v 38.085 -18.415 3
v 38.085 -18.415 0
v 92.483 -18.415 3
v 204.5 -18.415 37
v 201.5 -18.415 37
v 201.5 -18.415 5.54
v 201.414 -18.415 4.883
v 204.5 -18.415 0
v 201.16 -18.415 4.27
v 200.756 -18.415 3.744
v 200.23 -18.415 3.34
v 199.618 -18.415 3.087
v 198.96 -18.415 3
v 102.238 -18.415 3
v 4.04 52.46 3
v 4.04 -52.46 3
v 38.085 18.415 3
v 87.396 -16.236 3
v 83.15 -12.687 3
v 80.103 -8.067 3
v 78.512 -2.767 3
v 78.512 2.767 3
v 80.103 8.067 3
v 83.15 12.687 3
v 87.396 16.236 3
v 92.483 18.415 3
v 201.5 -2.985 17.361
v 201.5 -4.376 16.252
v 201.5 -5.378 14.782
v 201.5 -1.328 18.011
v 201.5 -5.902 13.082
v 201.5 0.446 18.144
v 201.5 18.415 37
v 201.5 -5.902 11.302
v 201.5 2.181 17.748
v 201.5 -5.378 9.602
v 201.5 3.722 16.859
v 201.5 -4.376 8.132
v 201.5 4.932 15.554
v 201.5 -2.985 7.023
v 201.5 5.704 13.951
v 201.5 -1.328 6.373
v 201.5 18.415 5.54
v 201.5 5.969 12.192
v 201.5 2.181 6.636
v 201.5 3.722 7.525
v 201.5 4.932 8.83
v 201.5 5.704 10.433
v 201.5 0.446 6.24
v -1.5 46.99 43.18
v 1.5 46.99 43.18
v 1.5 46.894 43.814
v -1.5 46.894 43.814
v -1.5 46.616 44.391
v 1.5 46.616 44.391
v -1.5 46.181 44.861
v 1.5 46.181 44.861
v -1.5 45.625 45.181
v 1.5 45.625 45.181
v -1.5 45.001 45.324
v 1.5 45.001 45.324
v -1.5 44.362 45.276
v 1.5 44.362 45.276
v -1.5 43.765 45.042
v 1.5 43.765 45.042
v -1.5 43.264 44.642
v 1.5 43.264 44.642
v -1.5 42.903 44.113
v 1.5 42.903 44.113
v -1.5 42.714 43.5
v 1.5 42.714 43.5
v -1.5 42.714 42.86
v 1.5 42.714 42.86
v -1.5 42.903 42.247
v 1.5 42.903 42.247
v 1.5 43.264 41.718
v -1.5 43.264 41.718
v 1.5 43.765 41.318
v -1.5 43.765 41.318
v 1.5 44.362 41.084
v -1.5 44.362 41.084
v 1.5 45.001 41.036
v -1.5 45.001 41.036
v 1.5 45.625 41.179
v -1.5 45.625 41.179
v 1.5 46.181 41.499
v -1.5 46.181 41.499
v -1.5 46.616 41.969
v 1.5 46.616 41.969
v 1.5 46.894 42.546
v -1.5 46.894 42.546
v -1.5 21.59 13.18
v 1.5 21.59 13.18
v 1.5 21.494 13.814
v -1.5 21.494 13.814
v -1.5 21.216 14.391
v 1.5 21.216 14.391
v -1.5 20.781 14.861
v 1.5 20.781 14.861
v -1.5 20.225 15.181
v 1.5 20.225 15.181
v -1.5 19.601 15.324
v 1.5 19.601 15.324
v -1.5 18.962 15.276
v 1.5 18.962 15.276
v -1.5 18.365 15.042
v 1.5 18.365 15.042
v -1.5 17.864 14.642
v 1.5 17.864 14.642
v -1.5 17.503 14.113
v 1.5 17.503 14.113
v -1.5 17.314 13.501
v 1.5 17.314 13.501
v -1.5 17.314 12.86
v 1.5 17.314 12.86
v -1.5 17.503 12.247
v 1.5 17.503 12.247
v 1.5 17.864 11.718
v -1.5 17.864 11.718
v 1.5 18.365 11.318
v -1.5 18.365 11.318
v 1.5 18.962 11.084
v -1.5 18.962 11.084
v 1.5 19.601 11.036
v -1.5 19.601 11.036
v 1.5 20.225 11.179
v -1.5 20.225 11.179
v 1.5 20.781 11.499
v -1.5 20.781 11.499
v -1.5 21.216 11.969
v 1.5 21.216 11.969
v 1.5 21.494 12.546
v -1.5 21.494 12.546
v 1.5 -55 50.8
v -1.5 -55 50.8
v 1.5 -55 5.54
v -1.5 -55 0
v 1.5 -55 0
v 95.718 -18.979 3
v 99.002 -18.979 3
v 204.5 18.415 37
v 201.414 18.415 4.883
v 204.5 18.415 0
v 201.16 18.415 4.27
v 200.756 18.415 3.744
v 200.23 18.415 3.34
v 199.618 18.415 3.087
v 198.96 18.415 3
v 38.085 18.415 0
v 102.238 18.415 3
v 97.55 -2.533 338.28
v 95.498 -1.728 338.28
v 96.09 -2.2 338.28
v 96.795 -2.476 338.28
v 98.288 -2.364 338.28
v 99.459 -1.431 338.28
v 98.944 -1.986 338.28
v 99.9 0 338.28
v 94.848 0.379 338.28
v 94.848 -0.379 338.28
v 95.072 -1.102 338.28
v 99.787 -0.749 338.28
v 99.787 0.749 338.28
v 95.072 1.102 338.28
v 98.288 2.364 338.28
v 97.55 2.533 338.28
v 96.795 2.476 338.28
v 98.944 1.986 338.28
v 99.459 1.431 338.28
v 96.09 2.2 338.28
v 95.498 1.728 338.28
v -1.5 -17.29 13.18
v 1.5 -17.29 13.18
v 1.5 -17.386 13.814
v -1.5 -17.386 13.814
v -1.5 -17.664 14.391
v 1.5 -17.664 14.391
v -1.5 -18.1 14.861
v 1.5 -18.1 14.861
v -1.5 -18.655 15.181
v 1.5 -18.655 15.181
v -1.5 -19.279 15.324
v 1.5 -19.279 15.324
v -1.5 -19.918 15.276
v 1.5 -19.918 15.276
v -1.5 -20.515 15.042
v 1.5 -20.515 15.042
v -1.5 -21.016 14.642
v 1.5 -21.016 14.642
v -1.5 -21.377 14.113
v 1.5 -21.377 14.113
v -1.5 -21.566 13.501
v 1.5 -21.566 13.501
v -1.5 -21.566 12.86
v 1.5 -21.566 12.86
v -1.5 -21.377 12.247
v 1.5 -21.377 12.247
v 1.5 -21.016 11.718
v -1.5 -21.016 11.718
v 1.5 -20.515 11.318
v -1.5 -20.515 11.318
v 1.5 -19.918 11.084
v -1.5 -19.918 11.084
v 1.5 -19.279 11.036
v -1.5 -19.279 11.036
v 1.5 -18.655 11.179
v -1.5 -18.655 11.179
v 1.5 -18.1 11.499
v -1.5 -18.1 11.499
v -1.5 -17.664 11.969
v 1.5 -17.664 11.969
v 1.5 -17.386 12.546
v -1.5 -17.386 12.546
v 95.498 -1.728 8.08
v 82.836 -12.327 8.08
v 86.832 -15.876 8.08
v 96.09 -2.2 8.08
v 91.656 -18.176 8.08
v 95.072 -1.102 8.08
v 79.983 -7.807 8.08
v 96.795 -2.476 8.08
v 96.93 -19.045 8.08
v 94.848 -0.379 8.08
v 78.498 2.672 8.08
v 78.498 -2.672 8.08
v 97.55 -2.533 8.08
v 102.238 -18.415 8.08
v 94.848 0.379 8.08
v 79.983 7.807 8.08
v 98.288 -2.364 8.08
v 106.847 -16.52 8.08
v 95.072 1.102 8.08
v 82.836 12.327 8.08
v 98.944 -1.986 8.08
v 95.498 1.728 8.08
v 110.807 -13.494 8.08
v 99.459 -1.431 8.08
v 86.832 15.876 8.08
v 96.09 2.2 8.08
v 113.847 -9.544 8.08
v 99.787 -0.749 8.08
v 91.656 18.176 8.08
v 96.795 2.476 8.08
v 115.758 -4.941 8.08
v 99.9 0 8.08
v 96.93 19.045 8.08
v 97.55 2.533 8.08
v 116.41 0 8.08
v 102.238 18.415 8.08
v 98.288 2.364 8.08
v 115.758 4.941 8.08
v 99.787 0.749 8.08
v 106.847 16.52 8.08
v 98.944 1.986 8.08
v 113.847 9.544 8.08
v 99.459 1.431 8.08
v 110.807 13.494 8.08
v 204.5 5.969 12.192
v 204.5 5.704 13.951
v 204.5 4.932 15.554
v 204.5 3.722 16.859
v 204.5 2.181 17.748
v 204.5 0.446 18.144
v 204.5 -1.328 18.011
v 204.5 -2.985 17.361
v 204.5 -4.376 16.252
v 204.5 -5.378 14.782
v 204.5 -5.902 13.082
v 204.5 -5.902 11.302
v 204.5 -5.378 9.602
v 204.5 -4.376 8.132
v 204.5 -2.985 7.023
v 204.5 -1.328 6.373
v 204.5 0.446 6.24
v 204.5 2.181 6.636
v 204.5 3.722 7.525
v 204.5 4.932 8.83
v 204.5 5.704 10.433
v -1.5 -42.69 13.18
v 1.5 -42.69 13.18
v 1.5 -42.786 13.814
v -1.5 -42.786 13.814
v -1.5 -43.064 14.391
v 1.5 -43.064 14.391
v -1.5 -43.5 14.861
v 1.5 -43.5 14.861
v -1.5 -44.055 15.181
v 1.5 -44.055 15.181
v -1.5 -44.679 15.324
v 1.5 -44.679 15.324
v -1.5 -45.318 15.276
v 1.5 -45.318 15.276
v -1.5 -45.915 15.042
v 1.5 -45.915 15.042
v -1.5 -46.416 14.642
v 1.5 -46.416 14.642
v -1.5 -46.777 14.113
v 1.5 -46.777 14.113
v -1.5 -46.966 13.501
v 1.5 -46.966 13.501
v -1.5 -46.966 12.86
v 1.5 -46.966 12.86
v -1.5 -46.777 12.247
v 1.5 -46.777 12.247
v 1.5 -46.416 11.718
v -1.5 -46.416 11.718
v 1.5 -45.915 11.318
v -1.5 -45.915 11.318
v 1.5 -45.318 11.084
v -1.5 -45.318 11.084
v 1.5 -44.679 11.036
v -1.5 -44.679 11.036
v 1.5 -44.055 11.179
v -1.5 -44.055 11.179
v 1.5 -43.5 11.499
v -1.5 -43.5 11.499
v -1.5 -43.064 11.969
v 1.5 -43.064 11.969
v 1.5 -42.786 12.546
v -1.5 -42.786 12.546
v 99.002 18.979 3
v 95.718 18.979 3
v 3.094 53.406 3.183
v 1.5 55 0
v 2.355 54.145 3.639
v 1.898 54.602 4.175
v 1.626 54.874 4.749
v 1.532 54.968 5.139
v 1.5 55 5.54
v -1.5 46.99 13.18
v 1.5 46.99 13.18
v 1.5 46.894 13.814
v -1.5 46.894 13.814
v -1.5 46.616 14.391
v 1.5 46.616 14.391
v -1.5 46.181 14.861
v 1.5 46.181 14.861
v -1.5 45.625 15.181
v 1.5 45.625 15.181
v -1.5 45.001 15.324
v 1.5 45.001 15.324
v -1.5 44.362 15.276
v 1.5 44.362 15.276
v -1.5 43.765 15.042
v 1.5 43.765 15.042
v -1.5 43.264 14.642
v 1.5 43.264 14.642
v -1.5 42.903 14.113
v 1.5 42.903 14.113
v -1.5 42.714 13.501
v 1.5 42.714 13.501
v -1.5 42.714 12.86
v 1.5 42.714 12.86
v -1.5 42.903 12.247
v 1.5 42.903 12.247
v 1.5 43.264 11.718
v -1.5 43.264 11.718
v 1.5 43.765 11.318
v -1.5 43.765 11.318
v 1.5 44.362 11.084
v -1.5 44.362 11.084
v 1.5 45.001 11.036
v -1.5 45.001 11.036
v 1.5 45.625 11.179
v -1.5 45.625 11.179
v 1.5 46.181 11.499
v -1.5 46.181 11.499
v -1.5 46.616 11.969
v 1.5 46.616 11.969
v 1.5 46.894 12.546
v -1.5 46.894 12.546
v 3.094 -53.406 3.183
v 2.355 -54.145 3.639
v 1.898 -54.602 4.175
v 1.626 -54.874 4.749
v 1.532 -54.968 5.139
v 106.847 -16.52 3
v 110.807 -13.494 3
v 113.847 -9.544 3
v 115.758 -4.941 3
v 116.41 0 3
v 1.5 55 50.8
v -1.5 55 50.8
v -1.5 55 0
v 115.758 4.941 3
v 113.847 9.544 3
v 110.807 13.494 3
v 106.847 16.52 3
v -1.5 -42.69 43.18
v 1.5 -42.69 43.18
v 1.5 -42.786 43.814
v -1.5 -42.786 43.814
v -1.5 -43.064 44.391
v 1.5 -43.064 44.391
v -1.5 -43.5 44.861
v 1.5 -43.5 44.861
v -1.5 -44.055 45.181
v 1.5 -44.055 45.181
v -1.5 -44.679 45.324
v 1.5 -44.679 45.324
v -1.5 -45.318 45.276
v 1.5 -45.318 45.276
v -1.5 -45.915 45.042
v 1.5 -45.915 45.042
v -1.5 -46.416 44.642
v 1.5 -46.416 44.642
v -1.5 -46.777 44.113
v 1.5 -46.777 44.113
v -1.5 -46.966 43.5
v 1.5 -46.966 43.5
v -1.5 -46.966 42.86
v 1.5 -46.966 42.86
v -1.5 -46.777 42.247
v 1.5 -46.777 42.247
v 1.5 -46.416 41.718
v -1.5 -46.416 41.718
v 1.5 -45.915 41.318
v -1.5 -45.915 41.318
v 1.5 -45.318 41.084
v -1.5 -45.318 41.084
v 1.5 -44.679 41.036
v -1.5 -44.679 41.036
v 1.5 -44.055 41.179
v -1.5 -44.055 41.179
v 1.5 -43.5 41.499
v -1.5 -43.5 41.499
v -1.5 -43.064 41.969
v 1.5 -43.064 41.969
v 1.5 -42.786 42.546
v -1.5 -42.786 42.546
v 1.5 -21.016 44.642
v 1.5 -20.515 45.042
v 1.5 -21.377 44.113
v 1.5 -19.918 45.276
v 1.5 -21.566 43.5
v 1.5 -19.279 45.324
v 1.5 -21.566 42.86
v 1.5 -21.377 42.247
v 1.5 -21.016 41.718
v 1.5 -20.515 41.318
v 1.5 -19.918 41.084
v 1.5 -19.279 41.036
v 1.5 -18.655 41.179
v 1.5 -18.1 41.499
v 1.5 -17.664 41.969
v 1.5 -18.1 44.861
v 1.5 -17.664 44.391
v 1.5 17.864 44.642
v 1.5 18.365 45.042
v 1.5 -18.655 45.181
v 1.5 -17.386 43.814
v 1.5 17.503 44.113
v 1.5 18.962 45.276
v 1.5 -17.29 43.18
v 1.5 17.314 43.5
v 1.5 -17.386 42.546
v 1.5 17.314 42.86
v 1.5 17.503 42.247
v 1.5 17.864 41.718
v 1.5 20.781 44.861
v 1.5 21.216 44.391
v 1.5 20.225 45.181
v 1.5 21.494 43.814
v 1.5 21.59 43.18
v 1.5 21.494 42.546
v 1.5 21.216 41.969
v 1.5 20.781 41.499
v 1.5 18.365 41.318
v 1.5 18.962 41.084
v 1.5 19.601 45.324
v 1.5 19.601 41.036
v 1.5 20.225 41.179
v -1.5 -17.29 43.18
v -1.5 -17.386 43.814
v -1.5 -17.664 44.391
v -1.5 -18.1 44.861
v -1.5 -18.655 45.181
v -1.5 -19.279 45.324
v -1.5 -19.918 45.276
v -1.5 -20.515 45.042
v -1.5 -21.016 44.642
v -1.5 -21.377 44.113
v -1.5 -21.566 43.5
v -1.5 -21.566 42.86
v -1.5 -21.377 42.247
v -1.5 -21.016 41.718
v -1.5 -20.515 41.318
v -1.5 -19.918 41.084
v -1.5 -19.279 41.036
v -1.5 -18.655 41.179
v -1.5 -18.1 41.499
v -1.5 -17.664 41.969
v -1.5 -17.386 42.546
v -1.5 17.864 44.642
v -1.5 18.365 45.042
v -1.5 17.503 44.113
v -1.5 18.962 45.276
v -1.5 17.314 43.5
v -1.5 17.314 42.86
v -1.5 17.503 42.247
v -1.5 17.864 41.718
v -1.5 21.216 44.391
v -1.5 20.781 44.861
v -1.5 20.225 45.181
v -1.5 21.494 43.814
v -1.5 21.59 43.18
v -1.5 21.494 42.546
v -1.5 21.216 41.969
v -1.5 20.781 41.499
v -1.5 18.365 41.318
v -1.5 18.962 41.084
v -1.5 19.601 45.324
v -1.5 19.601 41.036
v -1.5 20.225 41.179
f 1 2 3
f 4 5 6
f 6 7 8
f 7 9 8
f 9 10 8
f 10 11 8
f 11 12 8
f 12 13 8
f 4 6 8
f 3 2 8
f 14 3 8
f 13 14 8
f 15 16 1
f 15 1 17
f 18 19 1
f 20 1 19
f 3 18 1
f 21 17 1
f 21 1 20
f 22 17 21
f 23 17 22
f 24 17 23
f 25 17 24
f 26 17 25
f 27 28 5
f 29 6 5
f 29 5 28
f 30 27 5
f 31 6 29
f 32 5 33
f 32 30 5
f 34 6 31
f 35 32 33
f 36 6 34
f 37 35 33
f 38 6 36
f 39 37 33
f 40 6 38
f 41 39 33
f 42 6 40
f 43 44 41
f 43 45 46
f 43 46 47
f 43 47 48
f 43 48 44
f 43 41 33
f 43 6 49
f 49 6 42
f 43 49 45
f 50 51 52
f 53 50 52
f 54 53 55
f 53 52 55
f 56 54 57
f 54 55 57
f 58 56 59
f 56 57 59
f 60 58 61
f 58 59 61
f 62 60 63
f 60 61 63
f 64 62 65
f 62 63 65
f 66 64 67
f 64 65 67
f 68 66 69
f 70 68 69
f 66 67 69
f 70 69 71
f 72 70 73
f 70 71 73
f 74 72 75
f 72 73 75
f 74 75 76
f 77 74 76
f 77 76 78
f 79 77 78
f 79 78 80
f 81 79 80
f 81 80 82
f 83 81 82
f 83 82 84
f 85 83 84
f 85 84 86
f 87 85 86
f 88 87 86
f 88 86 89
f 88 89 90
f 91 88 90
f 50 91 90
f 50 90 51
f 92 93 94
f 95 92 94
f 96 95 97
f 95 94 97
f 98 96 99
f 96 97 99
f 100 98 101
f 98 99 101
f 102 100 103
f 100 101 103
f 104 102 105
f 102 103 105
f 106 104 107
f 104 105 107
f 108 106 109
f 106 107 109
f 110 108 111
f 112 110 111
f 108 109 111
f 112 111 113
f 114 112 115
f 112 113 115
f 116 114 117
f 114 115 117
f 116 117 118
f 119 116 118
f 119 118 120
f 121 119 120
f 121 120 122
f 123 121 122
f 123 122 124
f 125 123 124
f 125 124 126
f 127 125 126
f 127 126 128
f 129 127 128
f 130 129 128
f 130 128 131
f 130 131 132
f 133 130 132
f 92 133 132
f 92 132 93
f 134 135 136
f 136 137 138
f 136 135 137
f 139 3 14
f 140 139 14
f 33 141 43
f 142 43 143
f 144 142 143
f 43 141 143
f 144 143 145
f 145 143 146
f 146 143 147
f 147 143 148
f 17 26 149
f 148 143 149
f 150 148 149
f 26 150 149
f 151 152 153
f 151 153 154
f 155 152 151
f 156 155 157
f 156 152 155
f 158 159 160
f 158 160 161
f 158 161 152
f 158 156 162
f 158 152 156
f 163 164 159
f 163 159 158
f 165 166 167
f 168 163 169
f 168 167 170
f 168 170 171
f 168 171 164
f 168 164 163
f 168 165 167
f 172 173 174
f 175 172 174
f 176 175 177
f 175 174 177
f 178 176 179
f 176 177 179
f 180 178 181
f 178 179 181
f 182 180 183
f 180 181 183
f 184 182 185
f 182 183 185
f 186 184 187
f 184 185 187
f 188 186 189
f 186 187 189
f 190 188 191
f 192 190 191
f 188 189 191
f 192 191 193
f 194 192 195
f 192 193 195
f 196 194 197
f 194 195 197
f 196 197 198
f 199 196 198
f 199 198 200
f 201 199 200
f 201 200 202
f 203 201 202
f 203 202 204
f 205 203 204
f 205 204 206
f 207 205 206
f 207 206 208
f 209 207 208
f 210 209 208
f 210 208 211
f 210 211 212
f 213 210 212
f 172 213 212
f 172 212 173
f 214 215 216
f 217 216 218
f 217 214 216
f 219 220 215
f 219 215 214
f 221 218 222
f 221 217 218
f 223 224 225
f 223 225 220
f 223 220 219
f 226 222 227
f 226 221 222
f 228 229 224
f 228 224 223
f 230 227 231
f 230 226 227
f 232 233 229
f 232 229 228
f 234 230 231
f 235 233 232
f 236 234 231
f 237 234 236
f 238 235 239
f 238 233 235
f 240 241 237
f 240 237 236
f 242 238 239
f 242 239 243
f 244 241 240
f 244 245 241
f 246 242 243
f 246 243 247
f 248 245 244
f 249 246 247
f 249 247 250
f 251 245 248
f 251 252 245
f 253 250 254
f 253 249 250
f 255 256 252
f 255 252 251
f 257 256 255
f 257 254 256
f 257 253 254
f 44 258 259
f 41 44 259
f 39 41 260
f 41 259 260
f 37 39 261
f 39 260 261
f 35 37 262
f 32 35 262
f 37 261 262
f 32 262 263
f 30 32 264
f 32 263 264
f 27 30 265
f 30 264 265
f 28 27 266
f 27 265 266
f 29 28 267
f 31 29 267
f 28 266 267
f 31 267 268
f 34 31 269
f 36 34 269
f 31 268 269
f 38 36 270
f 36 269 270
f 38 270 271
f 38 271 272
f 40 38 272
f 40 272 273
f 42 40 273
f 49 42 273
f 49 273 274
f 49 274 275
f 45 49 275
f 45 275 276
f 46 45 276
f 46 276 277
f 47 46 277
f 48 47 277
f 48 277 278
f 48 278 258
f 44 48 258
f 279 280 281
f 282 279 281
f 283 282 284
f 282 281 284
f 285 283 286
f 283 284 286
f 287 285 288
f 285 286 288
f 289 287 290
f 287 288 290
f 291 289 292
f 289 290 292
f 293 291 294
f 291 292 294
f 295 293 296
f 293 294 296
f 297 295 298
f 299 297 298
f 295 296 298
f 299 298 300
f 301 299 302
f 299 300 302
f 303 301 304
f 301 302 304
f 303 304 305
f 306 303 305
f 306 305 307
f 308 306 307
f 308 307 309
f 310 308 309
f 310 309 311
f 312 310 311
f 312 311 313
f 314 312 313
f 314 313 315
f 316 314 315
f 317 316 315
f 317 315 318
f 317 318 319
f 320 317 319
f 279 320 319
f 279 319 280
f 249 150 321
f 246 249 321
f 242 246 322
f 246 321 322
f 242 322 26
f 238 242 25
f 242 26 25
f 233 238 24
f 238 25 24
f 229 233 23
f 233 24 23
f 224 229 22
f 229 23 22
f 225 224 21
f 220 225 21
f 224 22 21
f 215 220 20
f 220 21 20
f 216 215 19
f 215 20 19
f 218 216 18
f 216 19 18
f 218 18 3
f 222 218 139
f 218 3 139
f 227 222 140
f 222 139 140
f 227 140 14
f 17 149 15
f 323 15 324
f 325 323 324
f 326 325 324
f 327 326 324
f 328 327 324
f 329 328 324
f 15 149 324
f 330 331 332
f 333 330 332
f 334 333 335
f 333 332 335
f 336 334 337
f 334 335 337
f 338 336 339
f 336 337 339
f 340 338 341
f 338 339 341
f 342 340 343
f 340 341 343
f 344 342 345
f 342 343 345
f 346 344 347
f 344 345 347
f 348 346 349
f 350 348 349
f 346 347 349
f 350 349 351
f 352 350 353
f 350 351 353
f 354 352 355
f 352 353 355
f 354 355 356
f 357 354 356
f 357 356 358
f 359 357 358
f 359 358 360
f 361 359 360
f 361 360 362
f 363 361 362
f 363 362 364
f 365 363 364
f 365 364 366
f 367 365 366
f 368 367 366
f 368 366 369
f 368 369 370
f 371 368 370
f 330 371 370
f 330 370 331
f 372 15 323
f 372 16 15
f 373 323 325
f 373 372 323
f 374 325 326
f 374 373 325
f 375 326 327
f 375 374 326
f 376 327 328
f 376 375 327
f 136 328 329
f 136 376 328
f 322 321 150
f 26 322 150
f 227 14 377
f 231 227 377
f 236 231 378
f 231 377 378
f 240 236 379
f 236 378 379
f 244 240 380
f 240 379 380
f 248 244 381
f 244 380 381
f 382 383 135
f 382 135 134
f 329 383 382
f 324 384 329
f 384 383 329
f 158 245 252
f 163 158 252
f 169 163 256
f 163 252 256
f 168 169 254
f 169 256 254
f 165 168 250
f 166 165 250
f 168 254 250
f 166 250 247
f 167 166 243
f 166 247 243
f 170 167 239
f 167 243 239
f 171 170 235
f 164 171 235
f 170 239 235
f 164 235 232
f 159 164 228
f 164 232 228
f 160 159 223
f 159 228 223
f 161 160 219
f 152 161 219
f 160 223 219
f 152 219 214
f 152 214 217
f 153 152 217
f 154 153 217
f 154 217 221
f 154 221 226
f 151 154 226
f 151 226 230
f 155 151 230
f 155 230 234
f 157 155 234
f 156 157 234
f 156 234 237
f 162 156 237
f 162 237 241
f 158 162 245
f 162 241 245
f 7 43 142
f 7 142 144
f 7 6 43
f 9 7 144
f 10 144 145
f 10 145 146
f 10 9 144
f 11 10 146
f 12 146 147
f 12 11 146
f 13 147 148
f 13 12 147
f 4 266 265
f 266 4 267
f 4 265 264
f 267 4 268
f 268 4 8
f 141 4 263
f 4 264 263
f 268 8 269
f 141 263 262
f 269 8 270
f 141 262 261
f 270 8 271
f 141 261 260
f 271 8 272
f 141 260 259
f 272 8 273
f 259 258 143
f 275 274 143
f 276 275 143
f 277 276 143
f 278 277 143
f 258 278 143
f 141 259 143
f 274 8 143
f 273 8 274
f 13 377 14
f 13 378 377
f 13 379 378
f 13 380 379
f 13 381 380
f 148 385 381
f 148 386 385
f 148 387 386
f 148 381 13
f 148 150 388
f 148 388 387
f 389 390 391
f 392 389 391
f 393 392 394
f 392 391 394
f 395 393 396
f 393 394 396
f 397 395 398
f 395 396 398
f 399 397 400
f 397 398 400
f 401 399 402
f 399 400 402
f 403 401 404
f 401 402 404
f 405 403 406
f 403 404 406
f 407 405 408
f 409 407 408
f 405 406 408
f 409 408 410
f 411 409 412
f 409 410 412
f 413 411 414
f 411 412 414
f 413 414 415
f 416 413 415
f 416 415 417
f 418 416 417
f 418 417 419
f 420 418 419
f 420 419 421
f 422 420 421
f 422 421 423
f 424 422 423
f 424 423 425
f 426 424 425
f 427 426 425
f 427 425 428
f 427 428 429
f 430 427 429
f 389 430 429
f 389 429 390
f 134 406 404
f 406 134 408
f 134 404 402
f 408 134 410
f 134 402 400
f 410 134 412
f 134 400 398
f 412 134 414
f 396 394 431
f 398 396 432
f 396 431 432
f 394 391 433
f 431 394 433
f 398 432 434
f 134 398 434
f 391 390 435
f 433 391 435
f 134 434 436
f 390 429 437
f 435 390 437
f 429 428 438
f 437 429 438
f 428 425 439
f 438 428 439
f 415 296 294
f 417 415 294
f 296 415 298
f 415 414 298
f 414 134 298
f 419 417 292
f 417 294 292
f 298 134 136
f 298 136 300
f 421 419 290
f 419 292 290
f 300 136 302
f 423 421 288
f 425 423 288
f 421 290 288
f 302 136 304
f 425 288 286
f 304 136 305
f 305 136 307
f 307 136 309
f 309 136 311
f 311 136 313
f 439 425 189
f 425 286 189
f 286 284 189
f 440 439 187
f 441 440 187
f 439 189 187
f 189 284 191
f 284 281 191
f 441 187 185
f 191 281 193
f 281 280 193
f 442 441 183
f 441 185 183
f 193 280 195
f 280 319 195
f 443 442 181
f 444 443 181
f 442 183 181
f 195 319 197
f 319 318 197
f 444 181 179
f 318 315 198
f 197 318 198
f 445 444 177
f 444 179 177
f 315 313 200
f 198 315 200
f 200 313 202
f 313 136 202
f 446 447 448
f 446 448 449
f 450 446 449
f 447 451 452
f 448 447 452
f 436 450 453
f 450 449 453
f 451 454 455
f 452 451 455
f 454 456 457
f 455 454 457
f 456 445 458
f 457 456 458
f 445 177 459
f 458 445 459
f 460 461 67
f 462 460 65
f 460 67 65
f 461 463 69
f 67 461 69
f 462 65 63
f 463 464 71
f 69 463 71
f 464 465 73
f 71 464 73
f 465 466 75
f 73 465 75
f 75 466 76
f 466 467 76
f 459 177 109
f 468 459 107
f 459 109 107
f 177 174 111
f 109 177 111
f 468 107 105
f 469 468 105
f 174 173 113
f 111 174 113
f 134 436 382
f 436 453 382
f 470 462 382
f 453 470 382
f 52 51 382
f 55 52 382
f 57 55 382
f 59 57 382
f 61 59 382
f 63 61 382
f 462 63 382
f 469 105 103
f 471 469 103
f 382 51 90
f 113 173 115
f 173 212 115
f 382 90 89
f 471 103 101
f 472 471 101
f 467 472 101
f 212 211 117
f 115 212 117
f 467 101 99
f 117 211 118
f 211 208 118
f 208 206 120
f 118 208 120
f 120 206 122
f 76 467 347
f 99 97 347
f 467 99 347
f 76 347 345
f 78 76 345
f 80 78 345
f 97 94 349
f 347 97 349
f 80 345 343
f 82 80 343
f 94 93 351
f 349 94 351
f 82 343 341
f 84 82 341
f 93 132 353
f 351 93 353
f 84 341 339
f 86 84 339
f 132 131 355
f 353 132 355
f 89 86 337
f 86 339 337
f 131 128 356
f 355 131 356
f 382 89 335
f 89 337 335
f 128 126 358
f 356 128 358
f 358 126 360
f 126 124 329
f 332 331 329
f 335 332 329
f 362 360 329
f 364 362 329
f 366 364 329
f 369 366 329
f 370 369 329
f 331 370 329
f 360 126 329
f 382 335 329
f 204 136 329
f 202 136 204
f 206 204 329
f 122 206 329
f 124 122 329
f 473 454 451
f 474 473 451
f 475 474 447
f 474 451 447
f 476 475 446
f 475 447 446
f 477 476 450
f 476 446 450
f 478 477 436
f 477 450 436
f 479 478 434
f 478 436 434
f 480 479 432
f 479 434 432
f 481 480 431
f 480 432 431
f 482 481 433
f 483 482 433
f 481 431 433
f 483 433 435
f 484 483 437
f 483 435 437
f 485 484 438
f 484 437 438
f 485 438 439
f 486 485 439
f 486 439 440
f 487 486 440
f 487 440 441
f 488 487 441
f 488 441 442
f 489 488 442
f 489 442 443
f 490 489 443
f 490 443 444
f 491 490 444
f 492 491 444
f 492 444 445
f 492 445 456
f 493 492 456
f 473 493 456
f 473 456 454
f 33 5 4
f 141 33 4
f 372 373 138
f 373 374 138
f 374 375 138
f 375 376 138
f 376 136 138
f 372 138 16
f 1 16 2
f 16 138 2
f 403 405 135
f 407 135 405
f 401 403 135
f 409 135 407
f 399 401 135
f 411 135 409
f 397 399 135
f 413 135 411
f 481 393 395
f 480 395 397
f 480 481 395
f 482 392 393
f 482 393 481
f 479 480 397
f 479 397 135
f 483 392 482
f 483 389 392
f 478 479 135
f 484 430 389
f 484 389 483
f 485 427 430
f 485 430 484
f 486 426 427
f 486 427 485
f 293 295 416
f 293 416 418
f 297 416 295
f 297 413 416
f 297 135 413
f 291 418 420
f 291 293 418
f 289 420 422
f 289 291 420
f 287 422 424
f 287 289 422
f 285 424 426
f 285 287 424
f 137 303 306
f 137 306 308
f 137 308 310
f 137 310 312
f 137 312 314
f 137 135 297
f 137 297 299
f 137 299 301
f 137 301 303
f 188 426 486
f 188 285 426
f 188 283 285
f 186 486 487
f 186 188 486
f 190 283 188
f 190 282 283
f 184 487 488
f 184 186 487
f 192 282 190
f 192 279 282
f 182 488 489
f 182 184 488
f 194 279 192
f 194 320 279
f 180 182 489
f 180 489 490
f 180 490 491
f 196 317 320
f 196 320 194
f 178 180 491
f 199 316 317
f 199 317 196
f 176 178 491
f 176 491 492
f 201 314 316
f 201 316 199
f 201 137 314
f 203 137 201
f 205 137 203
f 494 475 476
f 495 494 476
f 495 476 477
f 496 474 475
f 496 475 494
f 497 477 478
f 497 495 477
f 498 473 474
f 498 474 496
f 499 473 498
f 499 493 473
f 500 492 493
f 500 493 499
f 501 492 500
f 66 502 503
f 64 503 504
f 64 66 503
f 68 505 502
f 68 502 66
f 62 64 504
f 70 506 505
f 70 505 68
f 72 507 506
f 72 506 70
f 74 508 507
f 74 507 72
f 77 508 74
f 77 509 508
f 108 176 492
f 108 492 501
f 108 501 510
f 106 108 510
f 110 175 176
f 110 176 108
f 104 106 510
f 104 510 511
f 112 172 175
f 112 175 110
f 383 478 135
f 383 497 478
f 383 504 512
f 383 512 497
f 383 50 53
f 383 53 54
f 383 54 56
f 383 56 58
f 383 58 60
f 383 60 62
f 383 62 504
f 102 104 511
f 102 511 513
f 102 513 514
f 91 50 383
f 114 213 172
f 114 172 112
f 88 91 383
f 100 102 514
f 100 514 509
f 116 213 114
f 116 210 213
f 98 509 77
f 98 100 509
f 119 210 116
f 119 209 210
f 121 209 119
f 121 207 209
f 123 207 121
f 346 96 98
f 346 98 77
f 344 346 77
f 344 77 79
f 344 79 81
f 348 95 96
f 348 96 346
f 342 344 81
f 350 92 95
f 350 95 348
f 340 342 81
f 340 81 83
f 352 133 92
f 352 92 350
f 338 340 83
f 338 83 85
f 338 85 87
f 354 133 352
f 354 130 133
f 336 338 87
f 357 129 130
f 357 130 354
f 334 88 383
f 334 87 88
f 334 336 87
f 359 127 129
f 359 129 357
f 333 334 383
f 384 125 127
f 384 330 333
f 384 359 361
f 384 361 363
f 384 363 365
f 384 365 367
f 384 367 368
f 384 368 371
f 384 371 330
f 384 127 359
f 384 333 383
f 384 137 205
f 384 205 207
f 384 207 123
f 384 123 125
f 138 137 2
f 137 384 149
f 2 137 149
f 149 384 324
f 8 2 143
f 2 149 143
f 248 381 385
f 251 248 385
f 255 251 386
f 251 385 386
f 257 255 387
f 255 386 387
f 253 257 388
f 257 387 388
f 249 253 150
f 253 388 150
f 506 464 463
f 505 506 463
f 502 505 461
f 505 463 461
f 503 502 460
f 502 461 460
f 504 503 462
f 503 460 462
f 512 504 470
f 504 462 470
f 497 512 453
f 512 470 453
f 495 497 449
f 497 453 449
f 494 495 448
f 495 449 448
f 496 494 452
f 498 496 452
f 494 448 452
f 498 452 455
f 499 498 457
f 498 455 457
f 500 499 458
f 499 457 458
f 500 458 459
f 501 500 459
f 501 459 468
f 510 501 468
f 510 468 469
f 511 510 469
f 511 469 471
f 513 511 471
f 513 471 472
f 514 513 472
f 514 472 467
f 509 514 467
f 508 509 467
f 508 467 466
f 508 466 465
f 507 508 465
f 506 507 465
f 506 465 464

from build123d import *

# Parameters (mm, degrees)
F0_W      = 2.999994
F0_H      = 110.000034
F0_H_2    = 36.83
F1_DEPTH  = 2.999994
F2_DEPTH  = 50.8
F3_DEPTH  = 36.999926
F4_R      = 2.1499957
F5_DEPTH  = 49.276
F6_R      = 5.969
F7_DEPTH  = 38.1
F8_R      = 2.54
F10_DEPTH = 5.08
F11_R     = 2.54
F12_DEPTH = 330.2
F13_R     = 2.54


with BuildPart() as f1:
    # F0 (on Top) → F1 (new body)
    with BuildSketch(Plane.XY):
        Rectangle(F0_W, F0_H)
        Polygon((38.085014, 18.415), (1.499997, 55.000017), (1.499997, -55.000017), (38.085014, -18.415), (201.500105, -18.415), (201.500105, 18.415), align=None)
        with Locations((203.000102, 0)):
            Rectangle(F0_W, F0_H_2)
    extrude(amount=F1_DEPTH)

    # F0 (on Top) → F2 (join)
    with BuildSketch(Plane.XY):
        Rectangle(F0_W, F0_H)
    extrude(amount=F2_DEPTH)

    # F0 (on Top) → F3 (join)
    with BuildSketch(Plane.XY):
        with Locations((203.000102, 0)):
            Rectangle(F0_W, F0_H_2)
    extrude(amount=F3_DEPTH)

    # F4 (on face) → F5 (cut)
    with BuildSketch(Plane.YZ.offset(1.499997)):
        with Locations((-44.840017, 43.18)):
            Circle(F4_R)
        with Locations((-44.840017, 13.18006)):
            Circle(F4_R)
        with Locations((-19.440017, 43.18)):
            Circle(F4_R)
        with Locations((-19.440017, 13.18006)):
            Circle(F4_R)
        with Locations((44.840017, 43.18)):
            Circle(F4_R)
        with Locations((19.440017, 43.18)):
            Circle(F4_R)
        with Locations((19.440017, 13.18006)):
            Circle(F4_R)
        with Locations((44.840017, 13.18006)):
            Circle(F4_R)
    extrude(amount=-F5_DEPTH, mode=Mode.SUBTRACT)

    # F6 (on face) → F7 (cut)
    with BuildSketch(Plane.YZ.offset(204.500099)):
        with Locations((0, 12.192)):
            Circle(F6_R)
    extrude(amount=-F7_DEPTH, mode=Mode.SUBTRACT)

    # F8
    f8_edges = [f1.edges().sort_by_distance(p)[0] for p in [
        (201.500105, 0, 2.999994),
    ]]
    fillet(f8_edges, radius=F8_R)

    # F9 (on face) → F10 (join)
    with BuildSketch(Plane.XY.offset(2.999994)):
        with BuildLine():
            ThreePointArc((92.4825774501, -18.415), (97.360105, -19.05), (102.2376325499, -18.415))
            Line((102.2376325499, -18.415), (92.4825774501, -18.415))
        make_face()
        with BuildLine():
            ThreePointArc((102.2376325499, -18.415), (112.4567834397, -11.6186401996), (116.410105, 0))
            ThreePointArc((116.410105, 0), (112.4567834397, 11.6186401996), (102.2376325499, 18.415))
            Line((102.2376325499, 18.415), (92.4825774501, 18.415))
            ThreePointArc((92.4825774501, 18.415), (78.310105, 0), (92.4825774501, -18.415))
            Line((92.4825774501, -18.415), (102.2376325499, -18.415))
        make_face()
        with BuildLine():
            Line((92.4825774501, 18.415), (102.2376325499, 18.415))
            ThreePointArc((102.2376325499, 18.415), (97.360105, 19.05), (92.4825774501, 18.415))
        make_face()
    extrude(amount=F10_DEPTH)

    # F11 (on face) → F12 (join)
    with BuildSketch(Plane.XY.offset(8.079994)):
        with Locations((97.360105, 0)):
            Circle(F11_R)
    extrude(amount=F12_DEPTH)

    # F13
    f13_edges = [f1.edges().sort_by_distance(p)[0] for p in [
        (1.499997, 0, 2.999994),
    ]]
    fillet(f13_edges, radius=F13_R)


solid = f1.part
